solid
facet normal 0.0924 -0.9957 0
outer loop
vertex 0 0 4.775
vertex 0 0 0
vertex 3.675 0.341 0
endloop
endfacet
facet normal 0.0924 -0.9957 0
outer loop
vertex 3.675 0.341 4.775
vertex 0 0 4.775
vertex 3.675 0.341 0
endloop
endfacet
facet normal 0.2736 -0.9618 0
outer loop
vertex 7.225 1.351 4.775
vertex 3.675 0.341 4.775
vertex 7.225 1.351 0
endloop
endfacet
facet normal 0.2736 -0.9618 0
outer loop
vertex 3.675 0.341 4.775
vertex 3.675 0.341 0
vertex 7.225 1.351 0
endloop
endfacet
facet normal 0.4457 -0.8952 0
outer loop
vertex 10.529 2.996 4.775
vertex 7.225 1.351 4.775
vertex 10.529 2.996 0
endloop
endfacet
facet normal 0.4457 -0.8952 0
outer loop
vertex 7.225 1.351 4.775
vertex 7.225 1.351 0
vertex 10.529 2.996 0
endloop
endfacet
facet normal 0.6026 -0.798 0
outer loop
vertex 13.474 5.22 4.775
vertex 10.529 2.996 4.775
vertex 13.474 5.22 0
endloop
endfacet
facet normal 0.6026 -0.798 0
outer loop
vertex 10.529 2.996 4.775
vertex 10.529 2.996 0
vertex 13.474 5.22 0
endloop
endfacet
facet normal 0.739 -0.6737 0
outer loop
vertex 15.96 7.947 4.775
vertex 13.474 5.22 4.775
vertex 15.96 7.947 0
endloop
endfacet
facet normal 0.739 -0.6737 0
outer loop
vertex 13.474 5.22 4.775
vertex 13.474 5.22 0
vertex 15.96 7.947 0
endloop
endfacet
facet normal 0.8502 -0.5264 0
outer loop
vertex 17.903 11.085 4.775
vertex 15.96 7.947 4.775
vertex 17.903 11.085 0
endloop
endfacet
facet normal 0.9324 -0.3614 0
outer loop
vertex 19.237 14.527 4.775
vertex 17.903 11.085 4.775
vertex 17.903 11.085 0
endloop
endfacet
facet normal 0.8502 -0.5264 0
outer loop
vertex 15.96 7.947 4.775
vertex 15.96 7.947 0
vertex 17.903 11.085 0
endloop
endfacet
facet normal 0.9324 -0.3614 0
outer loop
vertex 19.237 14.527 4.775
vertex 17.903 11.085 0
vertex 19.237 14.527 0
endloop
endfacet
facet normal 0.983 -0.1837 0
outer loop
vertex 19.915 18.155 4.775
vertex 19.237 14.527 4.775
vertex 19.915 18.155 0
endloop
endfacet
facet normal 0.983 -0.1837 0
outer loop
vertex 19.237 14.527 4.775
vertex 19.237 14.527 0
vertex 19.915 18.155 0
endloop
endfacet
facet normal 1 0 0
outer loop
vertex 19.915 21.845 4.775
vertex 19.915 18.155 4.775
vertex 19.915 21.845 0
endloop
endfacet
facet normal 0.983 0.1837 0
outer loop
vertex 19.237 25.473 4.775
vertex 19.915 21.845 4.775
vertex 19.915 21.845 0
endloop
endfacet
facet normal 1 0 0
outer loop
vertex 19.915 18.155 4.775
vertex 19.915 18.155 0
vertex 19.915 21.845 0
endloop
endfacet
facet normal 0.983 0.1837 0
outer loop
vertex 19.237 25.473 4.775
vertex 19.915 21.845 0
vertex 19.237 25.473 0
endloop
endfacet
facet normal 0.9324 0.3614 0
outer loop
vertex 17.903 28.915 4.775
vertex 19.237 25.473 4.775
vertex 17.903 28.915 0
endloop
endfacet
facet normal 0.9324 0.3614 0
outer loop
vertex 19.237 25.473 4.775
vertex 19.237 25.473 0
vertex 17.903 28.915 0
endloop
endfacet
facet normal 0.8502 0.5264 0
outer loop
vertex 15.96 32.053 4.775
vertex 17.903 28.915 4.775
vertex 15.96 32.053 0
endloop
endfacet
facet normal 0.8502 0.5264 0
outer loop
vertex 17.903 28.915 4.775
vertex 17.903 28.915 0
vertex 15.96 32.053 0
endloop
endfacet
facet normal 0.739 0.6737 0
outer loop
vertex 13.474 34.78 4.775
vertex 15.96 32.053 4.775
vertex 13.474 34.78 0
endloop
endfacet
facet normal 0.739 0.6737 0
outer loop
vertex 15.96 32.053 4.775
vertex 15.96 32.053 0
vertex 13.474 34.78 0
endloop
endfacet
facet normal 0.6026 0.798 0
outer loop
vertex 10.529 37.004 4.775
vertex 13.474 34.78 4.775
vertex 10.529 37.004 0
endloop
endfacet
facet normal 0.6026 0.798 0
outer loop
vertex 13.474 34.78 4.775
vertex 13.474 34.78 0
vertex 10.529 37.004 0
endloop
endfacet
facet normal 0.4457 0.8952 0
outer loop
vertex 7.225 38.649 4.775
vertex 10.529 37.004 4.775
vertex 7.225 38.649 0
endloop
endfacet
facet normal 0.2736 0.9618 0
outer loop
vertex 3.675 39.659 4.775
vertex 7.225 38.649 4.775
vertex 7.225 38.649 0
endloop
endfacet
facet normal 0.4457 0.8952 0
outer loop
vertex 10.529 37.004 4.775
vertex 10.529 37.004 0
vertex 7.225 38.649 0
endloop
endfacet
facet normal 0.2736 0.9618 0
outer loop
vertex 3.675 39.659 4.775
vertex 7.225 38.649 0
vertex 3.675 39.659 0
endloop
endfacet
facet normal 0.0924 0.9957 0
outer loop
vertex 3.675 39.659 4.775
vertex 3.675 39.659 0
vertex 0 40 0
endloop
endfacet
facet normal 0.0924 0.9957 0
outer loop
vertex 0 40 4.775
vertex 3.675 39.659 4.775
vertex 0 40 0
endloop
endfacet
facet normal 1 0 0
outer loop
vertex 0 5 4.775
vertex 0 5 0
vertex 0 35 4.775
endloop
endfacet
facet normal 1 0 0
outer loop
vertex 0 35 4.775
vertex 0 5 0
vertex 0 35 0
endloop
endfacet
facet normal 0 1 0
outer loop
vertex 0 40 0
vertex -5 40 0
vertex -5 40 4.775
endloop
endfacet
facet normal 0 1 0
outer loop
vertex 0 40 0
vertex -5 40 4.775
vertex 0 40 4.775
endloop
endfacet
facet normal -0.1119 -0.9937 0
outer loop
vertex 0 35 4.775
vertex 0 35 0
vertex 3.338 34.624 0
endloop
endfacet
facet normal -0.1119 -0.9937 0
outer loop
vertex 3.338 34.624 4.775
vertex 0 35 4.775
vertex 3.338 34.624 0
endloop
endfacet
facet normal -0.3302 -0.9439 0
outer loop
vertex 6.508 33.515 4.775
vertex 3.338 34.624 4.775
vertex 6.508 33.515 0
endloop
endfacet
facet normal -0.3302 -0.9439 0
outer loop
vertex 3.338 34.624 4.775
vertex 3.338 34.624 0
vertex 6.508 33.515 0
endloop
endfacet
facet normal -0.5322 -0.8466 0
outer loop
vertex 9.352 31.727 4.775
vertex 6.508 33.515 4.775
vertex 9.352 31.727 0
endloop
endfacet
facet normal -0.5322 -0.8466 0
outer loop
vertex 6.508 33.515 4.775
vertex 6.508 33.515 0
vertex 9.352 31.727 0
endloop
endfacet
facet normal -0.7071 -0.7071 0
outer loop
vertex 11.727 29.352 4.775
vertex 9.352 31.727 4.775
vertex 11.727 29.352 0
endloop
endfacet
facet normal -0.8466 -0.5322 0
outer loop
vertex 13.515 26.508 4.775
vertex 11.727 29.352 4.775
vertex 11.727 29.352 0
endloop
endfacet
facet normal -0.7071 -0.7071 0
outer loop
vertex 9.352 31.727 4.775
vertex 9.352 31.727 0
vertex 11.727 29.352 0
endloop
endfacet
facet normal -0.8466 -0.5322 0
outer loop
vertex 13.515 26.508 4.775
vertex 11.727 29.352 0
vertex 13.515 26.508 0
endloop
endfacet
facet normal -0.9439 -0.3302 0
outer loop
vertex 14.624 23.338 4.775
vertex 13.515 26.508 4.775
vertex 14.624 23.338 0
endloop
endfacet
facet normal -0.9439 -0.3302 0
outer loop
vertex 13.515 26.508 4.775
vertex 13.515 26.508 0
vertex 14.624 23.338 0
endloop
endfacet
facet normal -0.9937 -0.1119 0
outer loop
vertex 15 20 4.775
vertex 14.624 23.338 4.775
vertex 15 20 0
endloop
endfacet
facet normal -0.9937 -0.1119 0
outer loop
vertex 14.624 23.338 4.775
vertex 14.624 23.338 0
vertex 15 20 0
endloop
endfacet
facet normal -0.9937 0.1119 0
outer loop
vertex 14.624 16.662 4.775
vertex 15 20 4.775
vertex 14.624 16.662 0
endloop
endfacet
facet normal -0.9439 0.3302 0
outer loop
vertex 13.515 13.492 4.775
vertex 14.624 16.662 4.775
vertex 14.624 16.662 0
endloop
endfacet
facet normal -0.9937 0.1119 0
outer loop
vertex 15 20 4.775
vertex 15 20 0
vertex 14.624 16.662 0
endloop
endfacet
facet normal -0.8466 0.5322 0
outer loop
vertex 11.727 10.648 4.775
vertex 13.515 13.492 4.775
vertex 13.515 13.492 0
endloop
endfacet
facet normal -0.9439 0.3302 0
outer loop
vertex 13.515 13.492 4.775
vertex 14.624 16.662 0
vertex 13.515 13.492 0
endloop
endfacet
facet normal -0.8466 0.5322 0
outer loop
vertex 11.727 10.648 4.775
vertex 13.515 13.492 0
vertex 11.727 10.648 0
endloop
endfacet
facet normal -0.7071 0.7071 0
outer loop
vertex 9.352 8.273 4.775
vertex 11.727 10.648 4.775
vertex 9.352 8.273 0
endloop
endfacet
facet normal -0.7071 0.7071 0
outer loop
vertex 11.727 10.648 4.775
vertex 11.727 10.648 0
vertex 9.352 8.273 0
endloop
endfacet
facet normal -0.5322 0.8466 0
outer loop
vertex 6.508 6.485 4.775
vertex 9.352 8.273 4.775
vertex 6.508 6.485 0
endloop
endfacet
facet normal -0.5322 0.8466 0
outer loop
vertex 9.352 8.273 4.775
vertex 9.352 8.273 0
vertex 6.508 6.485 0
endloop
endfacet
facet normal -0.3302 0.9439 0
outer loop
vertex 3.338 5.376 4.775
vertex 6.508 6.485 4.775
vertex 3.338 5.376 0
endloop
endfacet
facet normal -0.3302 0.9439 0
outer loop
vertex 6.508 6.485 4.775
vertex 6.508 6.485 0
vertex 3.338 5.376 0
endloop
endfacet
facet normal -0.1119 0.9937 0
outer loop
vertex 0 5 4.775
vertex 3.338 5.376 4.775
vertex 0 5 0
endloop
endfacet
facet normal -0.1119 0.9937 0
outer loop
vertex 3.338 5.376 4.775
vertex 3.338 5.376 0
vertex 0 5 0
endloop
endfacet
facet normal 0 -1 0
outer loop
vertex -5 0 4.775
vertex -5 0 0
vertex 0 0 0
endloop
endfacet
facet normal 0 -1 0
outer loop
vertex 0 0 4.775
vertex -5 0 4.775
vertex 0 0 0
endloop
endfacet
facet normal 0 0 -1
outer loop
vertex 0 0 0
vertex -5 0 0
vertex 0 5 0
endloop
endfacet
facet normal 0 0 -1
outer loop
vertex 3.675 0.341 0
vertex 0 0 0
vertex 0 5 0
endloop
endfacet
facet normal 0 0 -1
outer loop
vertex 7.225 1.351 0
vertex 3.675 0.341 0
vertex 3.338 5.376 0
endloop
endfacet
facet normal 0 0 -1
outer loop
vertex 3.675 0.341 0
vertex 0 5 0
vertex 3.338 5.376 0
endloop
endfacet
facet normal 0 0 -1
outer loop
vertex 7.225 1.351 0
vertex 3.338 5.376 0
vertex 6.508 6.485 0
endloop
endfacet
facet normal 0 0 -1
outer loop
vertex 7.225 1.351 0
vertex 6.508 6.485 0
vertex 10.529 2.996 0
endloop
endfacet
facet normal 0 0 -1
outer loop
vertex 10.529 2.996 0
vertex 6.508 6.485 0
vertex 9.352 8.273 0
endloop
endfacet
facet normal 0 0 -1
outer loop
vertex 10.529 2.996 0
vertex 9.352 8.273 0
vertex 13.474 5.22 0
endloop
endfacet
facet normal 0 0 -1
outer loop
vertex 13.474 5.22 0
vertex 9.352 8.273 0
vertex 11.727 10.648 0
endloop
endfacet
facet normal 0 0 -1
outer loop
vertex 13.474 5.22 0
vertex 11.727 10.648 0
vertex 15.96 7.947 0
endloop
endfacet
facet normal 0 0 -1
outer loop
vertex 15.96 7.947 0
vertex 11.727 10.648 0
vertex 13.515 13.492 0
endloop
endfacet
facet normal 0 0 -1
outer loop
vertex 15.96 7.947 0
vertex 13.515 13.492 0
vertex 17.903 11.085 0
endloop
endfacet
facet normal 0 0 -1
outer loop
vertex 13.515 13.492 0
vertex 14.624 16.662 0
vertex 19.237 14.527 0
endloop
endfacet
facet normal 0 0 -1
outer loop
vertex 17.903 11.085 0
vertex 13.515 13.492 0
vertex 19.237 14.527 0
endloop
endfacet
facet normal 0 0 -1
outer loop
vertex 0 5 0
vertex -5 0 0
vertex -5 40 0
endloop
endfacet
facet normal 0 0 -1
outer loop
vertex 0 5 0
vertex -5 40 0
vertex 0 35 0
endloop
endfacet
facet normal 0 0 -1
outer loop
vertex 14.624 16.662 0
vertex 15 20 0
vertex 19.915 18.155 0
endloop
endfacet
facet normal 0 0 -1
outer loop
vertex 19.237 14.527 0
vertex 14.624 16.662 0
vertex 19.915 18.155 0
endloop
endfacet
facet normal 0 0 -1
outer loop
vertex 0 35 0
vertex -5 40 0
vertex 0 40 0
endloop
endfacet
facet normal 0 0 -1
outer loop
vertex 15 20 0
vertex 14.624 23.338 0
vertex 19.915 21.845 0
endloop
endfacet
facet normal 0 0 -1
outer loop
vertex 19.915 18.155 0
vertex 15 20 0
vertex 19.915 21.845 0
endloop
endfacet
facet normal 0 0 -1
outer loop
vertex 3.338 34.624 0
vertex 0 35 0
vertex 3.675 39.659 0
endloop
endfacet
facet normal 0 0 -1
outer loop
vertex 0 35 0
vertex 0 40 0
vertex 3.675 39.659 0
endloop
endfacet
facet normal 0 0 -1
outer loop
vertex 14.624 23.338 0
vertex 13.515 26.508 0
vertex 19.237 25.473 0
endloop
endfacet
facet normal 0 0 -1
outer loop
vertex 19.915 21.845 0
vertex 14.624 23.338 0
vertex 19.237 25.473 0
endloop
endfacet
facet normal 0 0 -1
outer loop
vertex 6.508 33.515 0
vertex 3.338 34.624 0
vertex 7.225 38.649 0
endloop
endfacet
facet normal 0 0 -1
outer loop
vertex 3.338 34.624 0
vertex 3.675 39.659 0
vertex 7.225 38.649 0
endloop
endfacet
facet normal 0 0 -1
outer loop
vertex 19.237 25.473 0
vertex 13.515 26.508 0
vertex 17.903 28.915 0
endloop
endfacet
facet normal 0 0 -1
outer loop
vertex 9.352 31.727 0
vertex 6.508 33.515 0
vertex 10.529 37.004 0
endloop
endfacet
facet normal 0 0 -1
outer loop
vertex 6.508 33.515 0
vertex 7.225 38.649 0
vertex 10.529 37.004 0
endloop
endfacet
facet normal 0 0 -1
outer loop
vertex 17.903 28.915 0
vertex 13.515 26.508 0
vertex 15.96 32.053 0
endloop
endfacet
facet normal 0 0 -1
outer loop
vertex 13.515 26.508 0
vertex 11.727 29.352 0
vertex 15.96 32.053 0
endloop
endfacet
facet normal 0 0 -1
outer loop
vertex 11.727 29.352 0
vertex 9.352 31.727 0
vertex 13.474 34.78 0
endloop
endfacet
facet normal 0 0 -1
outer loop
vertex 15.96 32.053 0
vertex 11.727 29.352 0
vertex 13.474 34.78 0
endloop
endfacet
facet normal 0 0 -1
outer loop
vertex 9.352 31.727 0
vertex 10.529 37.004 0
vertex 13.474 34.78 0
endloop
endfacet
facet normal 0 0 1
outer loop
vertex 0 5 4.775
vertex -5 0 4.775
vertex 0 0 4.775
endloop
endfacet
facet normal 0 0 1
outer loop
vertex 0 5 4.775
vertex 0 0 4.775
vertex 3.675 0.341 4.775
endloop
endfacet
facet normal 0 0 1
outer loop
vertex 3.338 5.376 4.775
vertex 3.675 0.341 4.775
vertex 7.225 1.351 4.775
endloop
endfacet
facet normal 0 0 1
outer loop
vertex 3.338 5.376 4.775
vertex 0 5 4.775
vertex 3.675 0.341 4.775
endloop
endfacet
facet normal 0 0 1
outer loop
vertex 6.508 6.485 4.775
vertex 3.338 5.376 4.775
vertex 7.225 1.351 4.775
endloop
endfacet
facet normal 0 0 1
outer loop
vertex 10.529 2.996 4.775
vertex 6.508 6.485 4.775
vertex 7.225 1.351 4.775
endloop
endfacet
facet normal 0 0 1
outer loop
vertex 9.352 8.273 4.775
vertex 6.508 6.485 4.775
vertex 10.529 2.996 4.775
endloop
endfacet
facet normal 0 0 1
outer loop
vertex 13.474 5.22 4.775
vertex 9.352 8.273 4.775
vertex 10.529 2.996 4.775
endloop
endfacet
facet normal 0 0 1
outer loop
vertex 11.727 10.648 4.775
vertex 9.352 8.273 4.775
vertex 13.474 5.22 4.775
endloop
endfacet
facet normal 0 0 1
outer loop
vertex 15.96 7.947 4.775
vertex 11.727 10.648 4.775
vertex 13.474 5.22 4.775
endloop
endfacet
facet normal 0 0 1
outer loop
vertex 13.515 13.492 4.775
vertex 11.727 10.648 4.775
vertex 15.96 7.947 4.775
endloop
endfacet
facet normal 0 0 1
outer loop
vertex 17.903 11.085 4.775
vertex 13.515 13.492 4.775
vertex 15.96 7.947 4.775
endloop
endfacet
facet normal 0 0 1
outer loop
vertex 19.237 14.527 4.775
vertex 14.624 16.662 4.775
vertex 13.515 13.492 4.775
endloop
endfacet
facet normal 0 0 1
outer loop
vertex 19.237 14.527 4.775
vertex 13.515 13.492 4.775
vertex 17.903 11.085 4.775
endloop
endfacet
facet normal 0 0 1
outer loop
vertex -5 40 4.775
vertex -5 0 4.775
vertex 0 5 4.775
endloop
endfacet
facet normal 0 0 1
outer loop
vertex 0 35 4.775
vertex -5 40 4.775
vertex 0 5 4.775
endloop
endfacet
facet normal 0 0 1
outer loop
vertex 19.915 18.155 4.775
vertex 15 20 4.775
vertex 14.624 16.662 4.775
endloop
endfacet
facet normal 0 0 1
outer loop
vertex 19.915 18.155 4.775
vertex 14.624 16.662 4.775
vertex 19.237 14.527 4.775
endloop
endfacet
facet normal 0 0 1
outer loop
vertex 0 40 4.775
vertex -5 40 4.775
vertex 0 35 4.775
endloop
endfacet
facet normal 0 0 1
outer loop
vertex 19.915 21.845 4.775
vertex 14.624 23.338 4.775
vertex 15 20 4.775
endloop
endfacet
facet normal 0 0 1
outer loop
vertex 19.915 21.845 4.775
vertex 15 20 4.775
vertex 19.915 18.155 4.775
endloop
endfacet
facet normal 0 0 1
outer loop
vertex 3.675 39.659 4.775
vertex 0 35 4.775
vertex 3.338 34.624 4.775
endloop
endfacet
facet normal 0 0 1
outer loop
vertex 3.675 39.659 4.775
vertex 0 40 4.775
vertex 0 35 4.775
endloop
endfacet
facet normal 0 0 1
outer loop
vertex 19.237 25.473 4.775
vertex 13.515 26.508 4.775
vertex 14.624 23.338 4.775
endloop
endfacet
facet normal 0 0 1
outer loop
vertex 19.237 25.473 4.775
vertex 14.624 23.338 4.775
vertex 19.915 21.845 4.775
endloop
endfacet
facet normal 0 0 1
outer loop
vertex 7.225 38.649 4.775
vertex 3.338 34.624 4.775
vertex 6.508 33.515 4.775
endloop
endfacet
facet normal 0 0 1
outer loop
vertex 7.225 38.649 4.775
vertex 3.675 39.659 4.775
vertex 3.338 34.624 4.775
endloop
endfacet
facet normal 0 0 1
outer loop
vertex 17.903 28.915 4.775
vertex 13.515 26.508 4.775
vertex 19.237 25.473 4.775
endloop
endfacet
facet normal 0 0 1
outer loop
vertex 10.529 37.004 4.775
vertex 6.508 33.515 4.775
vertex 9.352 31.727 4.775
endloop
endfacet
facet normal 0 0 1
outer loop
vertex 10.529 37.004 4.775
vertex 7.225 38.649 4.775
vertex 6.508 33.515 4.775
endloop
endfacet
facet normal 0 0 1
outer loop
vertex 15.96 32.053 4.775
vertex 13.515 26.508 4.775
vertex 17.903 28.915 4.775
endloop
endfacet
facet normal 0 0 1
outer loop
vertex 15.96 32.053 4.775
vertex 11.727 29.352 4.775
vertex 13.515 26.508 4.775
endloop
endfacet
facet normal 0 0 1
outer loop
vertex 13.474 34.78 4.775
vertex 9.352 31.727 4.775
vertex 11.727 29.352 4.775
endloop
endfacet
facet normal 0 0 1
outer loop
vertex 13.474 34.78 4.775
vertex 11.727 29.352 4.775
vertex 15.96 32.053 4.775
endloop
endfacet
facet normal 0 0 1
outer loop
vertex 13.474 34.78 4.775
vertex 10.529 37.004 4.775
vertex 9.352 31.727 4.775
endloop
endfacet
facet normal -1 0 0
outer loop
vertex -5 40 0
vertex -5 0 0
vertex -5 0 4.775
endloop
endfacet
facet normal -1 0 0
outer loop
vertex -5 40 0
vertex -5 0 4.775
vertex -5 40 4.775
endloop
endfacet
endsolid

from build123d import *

# Parameters (mm, degrees)
SKETCH3_W           = 5
SKETCH3_H           = 40
BOSS_EXTRUDE1_DEPTH = 4.7752


with BuildPart() as part:
    # Sketch3 → Boss-Extrude1 (new body)
    with BuildSketch(Plane.XY):
        with Locations((-2.5, 20)):
            Rectangle(SKETCH3_W, SKETCH3_H)
        with BuildLine():
            Line((0, 5), (0, 0))
            ThreePointArc((0, 0), (20, 20), (0, 40))
            Line((0, 40), (0, 35))
            ThreePointArc((0, 35), (15, 20), (0, 5))
        make_face()
    extrude(amount=BOSS_EXTRUDE1_DEPTH)


solid = part.part
